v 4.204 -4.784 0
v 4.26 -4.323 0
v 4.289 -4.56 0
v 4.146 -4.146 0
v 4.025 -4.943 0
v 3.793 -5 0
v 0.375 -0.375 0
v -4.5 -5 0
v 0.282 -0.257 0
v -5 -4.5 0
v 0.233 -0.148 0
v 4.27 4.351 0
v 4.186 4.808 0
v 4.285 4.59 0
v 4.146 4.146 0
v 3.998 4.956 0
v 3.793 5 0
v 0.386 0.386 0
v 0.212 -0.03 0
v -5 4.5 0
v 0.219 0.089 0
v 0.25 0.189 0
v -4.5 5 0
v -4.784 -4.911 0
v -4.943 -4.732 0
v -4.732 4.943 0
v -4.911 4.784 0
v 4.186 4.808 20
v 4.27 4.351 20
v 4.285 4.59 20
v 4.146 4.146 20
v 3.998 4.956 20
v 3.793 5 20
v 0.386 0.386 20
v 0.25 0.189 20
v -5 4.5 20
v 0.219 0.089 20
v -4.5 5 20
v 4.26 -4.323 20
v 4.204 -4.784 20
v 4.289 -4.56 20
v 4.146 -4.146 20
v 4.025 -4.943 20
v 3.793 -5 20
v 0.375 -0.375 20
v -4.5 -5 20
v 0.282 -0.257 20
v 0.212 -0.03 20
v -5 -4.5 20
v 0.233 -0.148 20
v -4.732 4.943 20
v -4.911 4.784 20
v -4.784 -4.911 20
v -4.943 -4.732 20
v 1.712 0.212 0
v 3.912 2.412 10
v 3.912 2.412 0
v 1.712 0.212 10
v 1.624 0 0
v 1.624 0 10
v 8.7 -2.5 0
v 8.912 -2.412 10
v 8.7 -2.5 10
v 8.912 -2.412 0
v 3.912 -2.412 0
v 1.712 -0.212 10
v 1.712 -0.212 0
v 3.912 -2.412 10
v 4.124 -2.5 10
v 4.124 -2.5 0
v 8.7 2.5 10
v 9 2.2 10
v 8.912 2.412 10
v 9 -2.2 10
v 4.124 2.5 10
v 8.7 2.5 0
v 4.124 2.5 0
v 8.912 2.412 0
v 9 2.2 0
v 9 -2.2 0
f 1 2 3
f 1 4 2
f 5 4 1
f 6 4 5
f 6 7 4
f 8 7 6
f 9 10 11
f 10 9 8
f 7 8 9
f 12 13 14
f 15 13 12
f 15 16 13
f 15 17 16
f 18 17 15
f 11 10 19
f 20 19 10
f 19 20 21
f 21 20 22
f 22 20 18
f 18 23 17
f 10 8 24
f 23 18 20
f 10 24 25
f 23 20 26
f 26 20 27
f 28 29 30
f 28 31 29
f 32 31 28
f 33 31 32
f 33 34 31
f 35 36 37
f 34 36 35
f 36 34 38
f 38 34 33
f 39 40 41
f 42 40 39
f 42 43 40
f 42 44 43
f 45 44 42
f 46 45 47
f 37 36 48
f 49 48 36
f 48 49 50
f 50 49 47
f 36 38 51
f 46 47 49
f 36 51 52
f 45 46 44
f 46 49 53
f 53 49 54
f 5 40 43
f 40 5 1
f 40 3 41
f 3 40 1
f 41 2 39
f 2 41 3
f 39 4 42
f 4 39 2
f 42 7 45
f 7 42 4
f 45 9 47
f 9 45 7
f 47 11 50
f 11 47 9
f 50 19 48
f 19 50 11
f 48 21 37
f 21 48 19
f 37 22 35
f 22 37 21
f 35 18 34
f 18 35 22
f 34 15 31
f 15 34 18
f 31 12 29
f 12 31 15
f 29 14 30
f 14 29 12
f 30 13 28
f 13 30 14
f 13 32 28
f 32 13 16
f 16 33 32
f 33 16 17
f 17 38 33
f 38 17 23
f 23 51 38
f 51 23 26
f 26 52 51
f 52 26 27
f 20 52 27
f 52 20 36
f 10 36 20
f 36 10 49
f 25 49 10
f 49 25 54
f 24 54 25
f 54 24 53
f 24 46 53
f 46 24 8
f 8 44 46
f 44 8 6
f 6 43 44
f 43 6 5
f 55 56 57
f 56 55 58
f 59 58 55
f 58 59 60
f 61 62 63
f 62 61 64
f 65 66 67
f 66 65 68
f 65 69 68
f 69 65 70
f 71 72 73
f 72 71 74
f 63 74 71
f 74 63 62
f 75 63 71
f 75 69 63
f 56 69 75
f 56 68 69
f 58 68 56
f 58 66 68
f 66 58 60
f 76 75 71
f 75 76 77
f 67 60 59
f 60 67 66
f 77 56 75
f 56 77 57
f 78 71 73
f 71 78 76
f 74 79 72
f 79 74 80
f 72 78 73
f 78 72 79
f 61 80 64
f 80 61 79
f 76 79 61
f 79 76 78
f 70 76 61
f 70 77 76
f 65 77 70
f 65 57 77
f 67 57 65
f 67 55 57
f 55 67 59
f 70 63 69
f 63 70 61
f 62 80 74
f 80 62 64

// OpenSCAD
$fs=1/4;
$fa=1/4;

part="both";//[anvil,die,both]

anvil_height=10;
anvil_length=20;
anvil_width=10;
anvil_radius=0.5;

die_height=5;
die_width=10;
die_thickness=5;
die_radius=0.3;

module anvil() linear_extrude(anvil_length) {
  offset(r=anvil_radius) offset(r=-2*anvil_radius) offset(r=anvil_radius) difference() {
    square ([anvil_height,anvil_width],center=true);
    rotate(-45) square(anvil_height); 
  }
}

module die() linear_extrude(die_width) offset(r=die_radius) offset(r=-die_radius) {
  rotate(45) square(die_thickness/sqrt(2),center=true);
  translate([0,-die_thickness/2]) square([die_height,die_thickness]);
}

if (part=="anvil") anvil();
if (part=="die") die();
 if (part=="both") {anvil(); translate([4,0]) die();}
